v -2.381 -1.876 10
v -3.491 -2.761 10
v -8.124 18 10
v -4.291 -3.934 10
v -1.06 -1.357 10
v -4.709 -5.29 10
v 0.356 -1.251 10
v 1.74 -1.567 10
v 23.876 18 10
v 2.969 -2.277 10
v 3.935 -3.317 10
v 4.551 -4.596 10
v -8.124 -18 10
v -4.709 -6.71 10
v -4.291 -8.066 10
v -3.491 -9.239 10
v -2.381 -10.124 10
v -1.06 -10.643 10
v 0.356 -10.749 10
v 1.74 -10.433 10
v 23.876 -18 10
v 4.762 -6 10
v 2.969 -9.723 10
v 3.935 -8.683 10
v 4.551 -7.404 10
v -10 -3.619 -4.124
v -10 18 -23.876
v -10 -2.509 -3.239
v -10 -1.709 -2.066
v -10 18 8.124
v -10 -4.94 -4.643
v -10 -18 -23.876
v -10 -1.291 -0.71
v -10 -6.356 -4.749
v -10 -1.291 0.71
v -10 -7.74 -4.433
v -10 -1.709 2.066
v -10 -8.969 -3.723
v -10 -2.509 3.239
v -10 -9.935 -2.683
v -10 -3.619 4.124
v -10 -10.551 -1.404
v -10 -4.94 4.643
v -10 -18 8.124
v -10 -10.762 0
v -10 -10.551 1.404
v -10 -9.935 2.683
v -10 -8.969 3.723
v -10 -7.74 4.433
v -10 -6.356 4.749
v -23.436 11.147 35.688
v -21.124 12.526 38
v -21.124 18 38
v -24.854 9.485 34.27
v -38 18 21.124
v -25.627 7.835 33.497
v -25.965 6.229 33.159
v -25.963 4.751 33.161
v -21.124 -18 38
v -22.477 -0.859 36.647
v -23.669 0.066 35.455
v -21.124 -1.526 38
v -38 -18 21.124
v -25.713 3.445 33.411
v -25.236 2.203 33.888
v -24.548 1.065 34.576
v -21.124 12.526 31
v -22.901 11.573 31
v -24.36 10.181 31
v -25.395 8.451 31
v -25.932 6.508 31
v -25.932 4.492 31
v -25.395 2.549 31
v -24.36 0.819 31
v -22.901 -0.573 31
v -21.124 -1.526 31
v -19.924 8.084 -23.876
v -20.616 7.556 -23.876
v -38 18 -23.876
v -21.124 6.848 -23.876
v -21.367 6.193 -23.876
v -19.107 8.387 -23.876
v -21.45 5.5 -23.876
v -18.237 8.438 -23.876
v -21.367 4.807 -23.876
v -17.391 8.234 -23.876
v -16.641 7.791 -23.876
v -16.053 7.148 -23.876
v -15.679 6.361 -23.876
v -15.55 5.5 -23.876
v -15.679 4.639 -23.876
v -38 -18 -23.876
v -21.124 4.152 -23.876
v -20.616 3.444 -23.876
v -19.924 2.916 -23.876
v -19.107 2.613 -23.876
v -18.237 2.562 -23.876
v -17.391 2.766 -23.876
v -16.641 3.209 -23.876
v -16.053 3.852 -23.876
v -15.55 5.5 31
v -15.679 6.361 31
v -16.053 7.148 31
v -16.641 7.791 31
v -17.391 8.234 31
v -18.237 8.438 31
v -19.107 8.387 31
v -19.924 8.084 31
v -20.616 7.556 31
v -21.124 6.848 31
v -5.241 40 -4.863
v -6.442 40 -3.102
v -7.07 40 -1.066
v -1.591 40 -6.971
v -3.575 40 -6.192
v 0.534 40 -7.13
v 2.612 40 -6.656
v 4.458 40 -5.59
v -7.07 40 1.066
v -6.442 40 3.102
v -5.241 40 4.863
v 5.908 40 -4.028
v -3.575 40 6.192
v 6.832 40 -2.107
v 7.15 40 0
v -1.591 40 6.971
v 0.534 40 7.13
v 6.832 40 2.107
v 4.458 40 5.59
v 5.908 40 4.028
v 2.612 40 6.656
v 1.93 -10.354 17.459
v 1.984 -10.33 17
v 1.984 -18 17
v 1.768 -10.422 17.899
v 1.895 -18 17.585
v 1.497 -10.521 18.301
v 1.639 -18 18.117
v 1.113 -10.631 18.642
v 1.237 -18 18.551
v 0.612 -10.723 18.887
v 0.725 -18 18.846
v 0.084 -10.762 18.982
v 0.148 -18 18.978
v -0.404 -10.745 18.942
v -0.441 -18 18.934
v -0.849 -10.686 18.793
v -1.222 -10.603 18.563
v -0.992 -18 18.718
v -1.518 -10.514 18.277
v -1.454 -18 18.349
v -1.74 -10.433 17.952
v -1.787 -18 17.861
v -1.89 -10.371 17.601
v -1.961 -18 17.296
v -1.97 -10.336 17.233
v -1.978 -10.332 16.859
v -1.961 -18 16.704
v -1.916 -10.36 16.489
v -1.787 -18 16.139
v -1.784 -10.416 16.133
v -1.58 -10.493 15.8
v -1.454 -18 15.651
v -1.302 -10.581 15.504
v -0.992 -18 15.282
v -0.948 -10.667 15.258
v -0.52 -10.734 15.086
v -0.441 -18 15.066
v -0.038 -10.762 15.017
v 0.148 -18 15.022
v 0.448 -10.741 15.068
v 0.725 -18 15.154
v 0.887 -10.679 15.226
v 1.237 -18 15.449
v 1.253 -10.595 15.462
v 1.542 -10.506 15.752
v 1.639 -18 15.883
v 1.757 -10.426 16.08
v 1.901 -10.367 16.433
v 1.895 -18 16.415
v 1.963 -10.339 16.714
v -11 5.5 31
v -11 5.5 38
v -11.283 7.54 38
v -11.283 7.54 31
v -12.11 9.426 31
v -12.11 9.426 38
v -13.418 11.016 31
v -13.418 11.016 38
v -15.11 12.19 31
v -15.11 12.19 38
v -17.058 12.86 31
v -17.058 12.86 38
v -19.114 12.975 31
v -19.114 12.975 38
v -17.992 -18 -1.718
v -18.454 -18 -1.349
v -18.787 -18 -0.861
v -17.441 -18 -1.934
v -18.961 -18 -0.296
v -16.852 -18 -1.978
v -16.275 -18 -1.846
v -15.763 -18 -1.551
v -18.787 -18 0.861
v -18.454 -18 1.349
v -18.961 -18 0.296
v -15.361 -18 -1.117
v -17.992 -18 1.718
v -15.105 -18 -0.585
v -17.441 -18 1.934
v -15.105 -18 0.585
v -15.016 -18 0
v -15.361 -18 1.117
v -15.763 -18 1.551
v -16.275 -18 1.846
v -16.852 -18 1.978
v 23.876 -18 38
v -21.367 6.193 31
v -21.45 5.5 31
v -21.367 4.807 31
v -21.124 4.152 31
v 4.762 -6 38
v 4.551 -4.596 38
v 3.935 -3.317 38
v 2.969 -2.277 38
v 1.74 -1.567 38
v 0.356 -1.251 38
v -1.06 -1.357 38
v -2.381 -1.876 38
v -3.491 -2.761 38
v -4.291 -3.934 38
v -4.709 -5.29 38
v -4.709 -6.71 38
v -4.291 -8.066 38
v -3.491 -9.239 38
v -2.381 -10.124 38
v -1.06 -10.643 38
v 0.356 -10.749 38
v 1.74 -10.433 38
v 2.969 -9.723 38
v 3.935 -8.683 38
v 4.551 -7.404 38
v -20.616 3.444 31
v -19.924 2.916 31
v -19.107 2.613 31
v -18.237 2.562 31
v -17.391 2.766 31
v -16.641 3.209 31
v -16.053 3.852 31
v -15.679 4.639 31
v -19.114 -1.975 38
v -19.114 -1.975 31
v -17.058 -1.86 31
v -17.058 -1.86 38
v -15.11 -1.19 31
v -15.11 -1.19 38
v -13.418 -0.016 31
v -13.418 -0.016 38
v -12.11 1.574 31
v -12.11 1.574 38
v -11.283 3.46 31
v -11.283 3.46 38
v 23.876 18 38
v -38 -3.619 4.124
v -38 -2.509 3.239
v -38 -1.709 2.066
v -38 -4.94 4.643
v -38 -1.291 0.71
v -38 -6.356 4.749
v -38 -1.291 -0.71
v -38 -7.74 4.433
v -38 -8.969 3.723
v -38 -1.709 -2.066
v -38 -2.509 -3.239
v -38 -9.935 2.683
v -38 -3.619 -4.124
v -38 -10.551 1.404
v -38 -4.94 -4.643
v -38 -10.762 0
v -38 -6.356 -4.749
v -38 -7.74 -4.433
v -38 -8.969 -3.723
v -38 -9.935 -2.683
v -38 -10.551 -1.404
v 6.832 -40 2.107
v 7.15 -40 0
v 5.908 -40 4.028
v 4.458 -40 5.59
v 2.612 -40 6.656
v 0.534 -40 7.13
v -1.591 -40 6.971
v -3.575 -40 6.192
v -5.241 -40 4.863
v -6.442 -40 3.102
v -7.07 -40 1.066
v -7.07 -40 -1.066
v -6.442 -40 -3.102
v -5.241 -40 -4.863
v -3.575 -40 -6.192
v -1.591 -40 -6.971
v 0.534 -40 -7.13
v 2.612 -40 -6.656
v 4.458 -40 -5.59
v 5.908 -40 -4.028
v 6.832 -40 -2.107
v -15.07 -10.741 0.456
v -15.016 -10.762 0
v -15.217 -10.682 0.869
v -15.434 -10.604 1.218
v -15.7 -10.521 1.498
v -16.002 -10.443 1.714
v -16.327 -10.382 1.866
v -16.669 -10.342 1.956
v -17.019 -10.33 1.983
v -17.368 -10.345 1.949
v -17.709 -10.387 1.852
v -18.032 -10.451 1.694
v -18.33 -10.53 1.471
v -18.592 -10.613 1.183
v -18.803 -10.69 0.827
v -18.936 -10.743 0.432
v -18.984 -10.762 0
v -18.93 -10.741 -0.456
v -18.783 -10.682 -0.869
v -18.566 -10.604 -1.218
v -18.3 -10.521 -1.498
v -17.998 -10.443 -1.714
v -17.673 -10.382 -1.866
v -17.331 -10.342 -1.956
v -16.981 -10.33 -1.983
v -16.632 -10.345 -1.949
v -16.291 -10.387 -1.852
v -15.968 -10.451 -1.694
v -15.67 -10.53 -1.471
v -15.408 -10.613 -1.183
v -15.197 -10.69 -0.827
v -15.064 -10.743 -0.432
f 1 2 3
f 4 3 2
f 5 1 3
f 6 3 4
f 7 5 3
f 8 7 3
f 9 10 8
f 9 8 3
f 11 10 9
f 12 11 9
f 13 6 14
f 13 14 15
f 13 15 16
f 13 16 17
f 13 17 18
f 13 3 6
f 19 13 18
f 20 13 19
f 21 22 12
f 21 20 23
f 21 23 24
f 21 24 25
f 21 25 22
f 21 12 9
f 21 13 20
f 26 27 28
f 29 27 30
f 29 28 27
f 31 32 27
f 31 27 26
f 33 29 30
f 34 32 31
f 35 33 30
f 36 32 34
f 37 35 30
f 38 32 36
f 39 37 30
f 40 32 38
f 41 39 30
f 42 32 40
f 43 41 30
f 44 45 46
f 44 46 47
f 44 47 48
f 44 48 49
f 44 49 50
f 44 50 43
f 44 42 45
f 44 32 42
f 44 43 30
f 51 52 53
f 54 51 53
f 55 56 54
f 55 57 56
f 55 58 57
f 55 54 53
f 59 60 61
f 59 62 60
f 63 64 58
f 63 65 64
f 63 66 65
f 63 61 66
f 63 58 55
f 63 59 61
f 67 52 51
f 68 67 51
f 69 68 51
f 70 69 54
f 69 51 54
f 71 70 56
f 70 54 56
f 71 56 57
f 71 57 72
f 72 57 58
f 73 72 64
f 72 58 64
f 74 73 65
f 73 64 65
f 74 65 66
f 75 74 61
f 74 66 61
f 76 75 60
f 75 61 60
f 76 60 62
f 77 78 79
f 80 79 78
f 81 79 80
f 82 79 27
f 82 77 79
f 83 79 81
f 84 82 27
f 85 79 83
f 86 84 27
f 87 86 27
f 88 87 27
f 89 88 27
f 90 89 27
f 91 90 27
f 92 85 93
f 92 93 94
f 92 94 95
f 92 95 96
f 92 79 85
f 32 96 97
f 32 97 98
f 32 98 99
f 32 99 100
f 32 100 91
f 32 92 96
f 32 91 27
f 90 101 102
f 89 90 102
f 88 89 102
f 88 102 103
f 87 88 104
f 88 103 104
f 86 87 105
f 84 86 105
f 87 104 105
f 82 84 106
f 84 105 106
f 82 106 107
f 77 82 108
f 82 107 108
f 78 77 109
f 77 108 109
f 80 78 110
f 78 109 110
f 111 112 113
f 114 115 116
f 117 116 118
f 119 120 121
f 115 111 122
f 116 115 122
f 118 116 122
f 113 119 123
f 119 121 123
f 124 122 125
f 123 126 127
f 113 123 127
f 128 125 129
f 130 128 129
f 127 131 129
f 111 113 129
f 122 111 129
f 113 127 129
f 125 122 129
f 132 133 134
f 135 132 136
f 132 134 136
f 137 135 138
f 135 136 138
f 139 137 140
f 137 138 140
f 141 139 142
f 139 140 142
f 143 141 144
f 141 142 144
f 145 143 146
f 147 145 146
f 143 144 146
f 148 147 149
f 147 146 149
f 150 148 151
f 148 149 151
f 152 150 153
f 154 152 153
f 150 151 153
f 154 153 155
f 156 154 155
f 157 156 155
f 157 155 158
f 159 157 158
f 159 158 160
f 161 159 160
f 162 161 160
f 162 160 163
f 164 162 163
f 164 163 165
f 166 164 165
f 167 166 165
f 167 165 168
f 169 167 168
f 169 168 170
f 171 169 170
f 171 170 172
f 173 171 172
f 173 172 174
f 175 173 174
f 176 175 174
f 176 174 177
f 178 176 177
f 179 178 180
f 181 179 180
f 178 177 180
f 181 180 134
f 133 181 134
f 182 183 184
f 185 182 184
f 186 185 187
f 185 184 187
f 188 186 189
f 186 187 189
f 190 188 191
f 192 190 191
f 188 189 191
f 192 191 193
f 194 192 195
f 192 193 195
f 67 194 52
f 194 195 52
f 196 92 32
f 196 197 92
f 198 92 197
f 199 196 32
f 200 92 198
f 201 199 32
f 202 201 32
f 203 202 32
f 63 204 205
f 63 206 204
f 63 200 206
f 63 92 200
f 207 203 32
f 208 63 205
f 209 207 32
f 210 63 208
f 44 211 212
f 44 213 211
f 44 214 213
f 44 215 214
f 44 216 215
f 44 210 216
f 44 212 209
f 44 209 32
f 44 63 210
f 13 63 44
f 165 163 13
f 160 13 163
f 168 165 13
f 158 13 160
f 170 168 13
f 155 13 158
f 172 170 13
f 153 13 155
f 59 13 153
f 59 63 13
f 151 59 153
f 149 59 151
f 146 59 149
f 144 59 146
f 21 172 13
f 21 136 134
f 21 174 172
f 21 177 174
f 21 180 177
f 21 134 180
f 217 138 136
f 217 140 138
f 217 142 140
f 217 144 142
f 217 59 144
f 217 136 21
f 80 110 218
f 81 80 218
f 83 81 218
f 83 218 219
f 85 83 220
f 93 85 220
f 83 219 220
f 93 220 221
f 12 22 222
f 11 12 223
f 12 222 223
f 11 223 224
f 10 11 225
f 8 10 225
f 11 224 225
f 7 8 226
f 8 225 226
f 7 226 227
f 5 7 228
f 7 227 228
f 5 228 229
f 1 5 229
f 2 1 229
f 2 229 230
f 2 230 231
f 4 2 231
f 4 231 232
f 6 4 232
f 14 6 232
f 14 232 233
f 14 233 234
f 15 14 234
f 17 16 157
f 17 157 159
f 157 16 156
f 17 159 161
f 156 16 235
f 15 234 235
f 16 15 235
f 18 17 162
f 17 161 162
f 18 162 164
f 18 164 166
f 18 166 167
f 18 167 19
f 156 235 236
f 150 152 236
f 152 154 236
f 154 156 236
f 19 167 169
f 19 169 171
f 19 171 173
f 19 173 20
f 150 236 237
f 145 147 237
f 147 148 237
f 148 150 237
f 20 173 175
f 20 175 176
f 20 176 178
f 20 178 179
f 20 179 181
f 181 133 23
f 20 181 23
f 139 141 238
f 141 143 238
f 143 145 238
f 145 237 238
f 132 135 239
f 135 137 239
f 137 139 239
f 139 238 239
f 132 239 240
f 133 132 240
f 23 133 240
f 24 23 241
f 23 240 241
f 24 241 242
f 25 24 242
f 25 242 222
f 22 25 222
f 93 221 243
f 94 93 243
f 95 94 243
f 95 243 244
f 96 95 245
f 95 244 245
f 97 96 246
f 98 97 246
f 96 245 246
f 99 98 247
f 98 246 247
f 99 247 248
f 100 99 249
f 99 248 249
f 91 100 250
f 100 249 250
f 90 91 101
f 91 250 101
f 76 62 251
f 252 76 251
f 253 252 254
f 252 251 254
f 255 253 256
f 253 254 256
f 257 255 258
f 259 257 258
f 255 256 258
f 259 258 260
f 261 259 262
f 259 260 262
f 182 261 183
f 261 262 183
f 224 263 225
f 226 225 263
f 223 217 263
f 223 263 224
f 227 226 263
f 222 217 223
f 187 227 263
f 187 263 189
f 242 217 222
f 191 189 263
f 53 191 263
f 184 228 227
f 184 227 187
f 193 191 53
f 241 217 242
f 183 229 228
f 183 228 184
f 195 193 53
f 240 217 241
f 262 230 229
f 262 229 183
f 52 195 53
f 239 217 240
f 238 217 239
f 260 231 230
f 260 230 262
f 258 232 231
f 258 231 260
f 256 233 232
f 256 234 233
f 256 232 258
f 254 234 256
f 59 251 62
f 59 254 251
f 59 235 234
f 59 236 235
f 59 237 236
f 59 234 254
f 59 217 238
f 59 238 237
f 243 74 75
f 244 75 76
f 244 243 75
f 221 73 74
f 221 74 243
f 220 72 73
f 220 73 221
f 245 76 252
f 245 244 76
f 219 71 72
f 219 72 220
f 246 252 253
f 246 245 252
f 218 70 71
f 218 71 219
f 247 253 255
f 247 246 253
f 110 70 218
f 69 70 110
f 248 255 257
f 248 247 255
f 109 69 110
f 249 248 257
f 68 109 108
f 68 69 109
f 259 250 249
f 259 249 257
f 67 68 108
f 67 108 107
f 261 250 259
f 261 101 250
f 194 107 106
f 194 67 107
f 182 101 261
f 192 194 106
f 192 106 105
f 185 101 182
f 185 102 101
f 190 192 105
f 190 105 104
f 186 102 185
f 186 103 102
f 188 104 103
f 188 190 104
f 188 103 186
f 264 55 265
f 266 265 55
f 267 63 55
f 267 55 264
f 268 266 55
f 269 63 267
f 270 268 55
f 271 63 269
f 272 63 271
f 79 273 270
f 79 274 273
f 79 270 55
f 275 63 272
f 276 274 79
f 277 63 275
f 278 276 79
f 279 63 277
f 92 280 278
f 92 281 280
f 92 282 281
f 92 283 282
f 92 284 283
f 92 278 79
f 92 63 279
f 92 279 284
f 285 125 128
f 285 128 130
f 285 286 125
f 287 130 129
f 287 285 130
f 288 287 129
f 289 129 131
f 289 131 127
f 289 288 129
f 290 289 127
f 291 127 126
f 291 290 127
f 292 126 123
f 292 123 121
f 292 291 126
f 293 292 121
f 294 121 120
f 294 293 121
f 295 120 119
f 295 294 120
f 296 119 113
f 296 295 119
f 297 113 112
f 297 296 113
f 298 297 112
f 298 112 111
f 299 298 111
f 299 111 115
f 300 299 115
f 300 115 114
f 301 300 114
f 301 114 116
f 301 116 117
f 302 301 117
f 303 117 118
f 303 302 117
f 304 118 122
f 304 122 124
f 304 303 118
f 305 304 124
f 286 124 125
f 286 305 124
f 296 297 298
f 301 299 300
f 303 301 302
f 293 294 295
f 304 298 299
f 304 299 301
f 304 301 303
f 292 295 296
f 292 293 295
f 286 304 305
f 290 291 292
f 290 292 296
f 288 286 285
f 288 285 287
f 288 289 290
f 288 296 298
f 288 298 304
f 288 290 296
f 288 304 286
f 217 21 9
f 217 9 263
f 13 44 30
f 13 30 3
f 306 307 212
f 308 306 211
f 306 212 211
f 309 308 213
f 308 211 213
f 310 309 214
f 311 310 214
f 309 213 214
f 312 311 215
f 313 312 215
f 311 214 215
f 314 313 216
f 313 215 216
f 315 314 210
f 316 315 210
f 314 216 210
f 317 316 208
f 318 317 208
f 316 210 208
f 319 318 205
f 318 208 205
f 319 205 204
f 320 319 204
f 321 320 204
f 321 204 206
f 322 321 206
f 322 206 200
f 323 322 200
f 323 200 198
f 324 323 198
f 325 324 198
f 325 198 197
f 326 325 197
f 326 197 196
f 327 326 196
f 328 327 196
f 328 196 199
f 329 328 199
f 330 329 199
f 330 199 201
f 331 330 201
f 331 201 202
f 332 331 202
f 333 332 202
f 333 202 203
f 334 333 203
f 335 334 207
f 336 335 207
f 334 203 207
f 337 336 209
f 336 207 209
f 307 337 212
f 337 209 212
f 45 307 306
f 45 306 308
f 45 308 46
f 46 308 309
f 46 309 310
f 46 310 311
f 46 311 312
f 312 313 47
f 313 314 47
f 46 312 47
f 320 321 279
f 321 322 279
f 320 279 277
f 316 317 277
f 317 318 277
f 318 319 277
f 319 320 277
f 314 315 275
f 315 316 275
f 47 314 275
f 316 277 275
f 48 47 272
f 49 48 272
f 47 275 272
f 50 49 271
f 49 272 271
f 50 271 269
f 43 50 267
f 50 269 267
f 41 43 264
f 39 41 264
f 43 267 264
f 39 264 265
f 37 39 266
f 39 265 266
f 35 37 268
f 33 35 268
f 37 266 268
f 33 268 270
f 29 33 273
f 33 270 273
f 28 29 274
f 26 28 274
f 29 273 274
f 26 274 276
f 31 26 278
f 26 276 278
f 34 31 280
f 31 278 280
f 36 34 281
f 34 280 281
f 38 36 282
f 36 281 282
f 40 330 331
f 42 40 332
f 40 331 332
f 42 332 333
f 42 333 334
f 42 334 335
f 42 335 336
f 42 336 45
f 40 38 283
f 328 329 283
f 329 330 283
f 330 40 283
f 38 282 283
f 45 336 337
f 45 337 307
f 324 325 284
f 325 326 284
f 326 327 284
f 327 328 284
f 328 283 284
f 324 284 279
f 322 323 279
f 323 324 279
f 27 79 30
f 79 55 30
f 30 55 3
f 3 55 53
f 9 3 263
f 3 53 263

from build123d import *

# Parameters (mm, degrees)
F1_DEPTH      = 18
F1_DEPTH_BACK = 18
F2_R          = 4.7625
F3_DEPTH      = 28
F0_R          = 7.15
F4_DEPTH      = 40
F4_DEPTH_BACK = 40
F5_R          = 4.7625
F6_DEPTH      = 28
F8_R          = 1.9835
F9_DEPTH      = 7.6712040309
F10_DEPTH     = 61.877
F11_DEPTH     = 7


with BuildPart() as f1:
    # F0 (on Front) → F1 (new body, two sides)
    with BuildSketch(Plane.XZ) as f1_sk:
        Polygon((-38, -23.876), (-10, -23.876), (-10, 8.124), (-8.124, 10), (23.876, 10), (23.876, 38), (-21.124, 38), (-38, 21.124), align=None)
    extrude(amount=F1_DEPTH)
    extrude(f1_sk.sketch, amount=-F1_DEPTH_BACK)

    # F2 (on face) → F3 (cut, through all)
    with BuildSketch(Plane(origin=(-38, 0, 0), x_dir=(0, -1, 0), z_dir=(-1, 0, 0))):
        with Locations((6, 0)):
            Circle(F2_R)
    extrude(amount=-F3_DEPTH, mode=Mode.SUBTRACT)

    # F5 (on face) → F6 (cut, through all)
    with BuildSketch(Plane.XY.offset(38)):
        with Locations((0, -6)):
            Circle(F5_R)
    extrude(amount=-F6_DEPTH, mode=Mode.SUBTRACT)

    # F8 (on face) → F9 (cut, through all)
    with BuildSketch(Plane.XZ.offset(18)):
        with Locations((-17, 0)):
            Circle(F8_R)
        with Locations((0, 17)):
            Circle(F8_R)
    extrude(amount=-F9_DEPTH, mode=Mode.SUBTRACT)

    # F7 (on face) → F10 (cut, through all)
    with BuildSketch(Plane.XY.offset(38)):
        with BuildLine():
            Line((-21.124, 4.1519925816), (-21.124, 6.8480074184))
            ThreePointArc((-21.124, 6.8480074184), (-21.45, 5.5), (-21.124, 4.1519925816))
        make_face()
        with BuildLine():
            ThreePointArc((-15.55, 5.5), (-17.8065665136, 8.3673419747), (-21.124, 6.8480074184))
            Line((-21.124, 6.8480074184), (-21.124, 4.1519925816))
            ThreePointArc((-21.124, 4.1519925816), (-17.8065665136, 2.6326580253), (-15.55, 5.5))
        make_face()
    extrude(amount=-F10_DEPTH, mode=Mode.SUBTRACT)

    # F7 (on face) → F11 (cut)
    with BuildSketch(Plane.XY.offset(38)):
        with BuildLine():
            Line((-21.124, 6.8480074184), (-21.124, 12.5259962995))
            ThreePointArc((-21.124, 12.5259962995), (-26, 5.5), (-21.124, -1.5259962995))
            Line((-21.124, -1.5259962995), (-21.124, 4.1519925816))
            ThreePointArc((-21.124, 4.1519925816), (-21.45, 5.5), (-21.124, 6.8480074184))
        make_face()
        with BuildLine():
            ThreePointArc((-21.124, -1.5259962995), (-14.2239036494, -0.6615744741), (-11, 5.5))
            ThreePointArc((-11, 5.5), (-14.2239036494, 11.6615744741), (-21.124, 12.5259962995))
            Line((-21.124, 12.5259962995), (-21.124, 6.8480074184))
            ThreePointArc((-21.124, 6.8480074184), (-17.8065665136, 8.3673419747), (-15.55, 5.5))
            ThreePointArc((-15.55, 5.5), (-17.8065665136, 2.6326580253), (-21.124, 4.1519925816))
            Line((-21.124, 4.1519925816), (-21.124, -1.5259962995))
        make_face()
    extrude(amount=-F11_DEPTH, mode=Mode.SUBTRACT)


with BuildPart() as f4:
    # F0 (on Front) → F4 (new body, two sides)
    with BuildSketch(Plane.XZ) as f4_sk:
        Circle(F0_R)
    extrude(amount=F4_DEPTH)
    extrude(f4_sk.sketch, amount=-F4_DEPTH_BACK)


solid = Compound([f1.part, f4.part])
